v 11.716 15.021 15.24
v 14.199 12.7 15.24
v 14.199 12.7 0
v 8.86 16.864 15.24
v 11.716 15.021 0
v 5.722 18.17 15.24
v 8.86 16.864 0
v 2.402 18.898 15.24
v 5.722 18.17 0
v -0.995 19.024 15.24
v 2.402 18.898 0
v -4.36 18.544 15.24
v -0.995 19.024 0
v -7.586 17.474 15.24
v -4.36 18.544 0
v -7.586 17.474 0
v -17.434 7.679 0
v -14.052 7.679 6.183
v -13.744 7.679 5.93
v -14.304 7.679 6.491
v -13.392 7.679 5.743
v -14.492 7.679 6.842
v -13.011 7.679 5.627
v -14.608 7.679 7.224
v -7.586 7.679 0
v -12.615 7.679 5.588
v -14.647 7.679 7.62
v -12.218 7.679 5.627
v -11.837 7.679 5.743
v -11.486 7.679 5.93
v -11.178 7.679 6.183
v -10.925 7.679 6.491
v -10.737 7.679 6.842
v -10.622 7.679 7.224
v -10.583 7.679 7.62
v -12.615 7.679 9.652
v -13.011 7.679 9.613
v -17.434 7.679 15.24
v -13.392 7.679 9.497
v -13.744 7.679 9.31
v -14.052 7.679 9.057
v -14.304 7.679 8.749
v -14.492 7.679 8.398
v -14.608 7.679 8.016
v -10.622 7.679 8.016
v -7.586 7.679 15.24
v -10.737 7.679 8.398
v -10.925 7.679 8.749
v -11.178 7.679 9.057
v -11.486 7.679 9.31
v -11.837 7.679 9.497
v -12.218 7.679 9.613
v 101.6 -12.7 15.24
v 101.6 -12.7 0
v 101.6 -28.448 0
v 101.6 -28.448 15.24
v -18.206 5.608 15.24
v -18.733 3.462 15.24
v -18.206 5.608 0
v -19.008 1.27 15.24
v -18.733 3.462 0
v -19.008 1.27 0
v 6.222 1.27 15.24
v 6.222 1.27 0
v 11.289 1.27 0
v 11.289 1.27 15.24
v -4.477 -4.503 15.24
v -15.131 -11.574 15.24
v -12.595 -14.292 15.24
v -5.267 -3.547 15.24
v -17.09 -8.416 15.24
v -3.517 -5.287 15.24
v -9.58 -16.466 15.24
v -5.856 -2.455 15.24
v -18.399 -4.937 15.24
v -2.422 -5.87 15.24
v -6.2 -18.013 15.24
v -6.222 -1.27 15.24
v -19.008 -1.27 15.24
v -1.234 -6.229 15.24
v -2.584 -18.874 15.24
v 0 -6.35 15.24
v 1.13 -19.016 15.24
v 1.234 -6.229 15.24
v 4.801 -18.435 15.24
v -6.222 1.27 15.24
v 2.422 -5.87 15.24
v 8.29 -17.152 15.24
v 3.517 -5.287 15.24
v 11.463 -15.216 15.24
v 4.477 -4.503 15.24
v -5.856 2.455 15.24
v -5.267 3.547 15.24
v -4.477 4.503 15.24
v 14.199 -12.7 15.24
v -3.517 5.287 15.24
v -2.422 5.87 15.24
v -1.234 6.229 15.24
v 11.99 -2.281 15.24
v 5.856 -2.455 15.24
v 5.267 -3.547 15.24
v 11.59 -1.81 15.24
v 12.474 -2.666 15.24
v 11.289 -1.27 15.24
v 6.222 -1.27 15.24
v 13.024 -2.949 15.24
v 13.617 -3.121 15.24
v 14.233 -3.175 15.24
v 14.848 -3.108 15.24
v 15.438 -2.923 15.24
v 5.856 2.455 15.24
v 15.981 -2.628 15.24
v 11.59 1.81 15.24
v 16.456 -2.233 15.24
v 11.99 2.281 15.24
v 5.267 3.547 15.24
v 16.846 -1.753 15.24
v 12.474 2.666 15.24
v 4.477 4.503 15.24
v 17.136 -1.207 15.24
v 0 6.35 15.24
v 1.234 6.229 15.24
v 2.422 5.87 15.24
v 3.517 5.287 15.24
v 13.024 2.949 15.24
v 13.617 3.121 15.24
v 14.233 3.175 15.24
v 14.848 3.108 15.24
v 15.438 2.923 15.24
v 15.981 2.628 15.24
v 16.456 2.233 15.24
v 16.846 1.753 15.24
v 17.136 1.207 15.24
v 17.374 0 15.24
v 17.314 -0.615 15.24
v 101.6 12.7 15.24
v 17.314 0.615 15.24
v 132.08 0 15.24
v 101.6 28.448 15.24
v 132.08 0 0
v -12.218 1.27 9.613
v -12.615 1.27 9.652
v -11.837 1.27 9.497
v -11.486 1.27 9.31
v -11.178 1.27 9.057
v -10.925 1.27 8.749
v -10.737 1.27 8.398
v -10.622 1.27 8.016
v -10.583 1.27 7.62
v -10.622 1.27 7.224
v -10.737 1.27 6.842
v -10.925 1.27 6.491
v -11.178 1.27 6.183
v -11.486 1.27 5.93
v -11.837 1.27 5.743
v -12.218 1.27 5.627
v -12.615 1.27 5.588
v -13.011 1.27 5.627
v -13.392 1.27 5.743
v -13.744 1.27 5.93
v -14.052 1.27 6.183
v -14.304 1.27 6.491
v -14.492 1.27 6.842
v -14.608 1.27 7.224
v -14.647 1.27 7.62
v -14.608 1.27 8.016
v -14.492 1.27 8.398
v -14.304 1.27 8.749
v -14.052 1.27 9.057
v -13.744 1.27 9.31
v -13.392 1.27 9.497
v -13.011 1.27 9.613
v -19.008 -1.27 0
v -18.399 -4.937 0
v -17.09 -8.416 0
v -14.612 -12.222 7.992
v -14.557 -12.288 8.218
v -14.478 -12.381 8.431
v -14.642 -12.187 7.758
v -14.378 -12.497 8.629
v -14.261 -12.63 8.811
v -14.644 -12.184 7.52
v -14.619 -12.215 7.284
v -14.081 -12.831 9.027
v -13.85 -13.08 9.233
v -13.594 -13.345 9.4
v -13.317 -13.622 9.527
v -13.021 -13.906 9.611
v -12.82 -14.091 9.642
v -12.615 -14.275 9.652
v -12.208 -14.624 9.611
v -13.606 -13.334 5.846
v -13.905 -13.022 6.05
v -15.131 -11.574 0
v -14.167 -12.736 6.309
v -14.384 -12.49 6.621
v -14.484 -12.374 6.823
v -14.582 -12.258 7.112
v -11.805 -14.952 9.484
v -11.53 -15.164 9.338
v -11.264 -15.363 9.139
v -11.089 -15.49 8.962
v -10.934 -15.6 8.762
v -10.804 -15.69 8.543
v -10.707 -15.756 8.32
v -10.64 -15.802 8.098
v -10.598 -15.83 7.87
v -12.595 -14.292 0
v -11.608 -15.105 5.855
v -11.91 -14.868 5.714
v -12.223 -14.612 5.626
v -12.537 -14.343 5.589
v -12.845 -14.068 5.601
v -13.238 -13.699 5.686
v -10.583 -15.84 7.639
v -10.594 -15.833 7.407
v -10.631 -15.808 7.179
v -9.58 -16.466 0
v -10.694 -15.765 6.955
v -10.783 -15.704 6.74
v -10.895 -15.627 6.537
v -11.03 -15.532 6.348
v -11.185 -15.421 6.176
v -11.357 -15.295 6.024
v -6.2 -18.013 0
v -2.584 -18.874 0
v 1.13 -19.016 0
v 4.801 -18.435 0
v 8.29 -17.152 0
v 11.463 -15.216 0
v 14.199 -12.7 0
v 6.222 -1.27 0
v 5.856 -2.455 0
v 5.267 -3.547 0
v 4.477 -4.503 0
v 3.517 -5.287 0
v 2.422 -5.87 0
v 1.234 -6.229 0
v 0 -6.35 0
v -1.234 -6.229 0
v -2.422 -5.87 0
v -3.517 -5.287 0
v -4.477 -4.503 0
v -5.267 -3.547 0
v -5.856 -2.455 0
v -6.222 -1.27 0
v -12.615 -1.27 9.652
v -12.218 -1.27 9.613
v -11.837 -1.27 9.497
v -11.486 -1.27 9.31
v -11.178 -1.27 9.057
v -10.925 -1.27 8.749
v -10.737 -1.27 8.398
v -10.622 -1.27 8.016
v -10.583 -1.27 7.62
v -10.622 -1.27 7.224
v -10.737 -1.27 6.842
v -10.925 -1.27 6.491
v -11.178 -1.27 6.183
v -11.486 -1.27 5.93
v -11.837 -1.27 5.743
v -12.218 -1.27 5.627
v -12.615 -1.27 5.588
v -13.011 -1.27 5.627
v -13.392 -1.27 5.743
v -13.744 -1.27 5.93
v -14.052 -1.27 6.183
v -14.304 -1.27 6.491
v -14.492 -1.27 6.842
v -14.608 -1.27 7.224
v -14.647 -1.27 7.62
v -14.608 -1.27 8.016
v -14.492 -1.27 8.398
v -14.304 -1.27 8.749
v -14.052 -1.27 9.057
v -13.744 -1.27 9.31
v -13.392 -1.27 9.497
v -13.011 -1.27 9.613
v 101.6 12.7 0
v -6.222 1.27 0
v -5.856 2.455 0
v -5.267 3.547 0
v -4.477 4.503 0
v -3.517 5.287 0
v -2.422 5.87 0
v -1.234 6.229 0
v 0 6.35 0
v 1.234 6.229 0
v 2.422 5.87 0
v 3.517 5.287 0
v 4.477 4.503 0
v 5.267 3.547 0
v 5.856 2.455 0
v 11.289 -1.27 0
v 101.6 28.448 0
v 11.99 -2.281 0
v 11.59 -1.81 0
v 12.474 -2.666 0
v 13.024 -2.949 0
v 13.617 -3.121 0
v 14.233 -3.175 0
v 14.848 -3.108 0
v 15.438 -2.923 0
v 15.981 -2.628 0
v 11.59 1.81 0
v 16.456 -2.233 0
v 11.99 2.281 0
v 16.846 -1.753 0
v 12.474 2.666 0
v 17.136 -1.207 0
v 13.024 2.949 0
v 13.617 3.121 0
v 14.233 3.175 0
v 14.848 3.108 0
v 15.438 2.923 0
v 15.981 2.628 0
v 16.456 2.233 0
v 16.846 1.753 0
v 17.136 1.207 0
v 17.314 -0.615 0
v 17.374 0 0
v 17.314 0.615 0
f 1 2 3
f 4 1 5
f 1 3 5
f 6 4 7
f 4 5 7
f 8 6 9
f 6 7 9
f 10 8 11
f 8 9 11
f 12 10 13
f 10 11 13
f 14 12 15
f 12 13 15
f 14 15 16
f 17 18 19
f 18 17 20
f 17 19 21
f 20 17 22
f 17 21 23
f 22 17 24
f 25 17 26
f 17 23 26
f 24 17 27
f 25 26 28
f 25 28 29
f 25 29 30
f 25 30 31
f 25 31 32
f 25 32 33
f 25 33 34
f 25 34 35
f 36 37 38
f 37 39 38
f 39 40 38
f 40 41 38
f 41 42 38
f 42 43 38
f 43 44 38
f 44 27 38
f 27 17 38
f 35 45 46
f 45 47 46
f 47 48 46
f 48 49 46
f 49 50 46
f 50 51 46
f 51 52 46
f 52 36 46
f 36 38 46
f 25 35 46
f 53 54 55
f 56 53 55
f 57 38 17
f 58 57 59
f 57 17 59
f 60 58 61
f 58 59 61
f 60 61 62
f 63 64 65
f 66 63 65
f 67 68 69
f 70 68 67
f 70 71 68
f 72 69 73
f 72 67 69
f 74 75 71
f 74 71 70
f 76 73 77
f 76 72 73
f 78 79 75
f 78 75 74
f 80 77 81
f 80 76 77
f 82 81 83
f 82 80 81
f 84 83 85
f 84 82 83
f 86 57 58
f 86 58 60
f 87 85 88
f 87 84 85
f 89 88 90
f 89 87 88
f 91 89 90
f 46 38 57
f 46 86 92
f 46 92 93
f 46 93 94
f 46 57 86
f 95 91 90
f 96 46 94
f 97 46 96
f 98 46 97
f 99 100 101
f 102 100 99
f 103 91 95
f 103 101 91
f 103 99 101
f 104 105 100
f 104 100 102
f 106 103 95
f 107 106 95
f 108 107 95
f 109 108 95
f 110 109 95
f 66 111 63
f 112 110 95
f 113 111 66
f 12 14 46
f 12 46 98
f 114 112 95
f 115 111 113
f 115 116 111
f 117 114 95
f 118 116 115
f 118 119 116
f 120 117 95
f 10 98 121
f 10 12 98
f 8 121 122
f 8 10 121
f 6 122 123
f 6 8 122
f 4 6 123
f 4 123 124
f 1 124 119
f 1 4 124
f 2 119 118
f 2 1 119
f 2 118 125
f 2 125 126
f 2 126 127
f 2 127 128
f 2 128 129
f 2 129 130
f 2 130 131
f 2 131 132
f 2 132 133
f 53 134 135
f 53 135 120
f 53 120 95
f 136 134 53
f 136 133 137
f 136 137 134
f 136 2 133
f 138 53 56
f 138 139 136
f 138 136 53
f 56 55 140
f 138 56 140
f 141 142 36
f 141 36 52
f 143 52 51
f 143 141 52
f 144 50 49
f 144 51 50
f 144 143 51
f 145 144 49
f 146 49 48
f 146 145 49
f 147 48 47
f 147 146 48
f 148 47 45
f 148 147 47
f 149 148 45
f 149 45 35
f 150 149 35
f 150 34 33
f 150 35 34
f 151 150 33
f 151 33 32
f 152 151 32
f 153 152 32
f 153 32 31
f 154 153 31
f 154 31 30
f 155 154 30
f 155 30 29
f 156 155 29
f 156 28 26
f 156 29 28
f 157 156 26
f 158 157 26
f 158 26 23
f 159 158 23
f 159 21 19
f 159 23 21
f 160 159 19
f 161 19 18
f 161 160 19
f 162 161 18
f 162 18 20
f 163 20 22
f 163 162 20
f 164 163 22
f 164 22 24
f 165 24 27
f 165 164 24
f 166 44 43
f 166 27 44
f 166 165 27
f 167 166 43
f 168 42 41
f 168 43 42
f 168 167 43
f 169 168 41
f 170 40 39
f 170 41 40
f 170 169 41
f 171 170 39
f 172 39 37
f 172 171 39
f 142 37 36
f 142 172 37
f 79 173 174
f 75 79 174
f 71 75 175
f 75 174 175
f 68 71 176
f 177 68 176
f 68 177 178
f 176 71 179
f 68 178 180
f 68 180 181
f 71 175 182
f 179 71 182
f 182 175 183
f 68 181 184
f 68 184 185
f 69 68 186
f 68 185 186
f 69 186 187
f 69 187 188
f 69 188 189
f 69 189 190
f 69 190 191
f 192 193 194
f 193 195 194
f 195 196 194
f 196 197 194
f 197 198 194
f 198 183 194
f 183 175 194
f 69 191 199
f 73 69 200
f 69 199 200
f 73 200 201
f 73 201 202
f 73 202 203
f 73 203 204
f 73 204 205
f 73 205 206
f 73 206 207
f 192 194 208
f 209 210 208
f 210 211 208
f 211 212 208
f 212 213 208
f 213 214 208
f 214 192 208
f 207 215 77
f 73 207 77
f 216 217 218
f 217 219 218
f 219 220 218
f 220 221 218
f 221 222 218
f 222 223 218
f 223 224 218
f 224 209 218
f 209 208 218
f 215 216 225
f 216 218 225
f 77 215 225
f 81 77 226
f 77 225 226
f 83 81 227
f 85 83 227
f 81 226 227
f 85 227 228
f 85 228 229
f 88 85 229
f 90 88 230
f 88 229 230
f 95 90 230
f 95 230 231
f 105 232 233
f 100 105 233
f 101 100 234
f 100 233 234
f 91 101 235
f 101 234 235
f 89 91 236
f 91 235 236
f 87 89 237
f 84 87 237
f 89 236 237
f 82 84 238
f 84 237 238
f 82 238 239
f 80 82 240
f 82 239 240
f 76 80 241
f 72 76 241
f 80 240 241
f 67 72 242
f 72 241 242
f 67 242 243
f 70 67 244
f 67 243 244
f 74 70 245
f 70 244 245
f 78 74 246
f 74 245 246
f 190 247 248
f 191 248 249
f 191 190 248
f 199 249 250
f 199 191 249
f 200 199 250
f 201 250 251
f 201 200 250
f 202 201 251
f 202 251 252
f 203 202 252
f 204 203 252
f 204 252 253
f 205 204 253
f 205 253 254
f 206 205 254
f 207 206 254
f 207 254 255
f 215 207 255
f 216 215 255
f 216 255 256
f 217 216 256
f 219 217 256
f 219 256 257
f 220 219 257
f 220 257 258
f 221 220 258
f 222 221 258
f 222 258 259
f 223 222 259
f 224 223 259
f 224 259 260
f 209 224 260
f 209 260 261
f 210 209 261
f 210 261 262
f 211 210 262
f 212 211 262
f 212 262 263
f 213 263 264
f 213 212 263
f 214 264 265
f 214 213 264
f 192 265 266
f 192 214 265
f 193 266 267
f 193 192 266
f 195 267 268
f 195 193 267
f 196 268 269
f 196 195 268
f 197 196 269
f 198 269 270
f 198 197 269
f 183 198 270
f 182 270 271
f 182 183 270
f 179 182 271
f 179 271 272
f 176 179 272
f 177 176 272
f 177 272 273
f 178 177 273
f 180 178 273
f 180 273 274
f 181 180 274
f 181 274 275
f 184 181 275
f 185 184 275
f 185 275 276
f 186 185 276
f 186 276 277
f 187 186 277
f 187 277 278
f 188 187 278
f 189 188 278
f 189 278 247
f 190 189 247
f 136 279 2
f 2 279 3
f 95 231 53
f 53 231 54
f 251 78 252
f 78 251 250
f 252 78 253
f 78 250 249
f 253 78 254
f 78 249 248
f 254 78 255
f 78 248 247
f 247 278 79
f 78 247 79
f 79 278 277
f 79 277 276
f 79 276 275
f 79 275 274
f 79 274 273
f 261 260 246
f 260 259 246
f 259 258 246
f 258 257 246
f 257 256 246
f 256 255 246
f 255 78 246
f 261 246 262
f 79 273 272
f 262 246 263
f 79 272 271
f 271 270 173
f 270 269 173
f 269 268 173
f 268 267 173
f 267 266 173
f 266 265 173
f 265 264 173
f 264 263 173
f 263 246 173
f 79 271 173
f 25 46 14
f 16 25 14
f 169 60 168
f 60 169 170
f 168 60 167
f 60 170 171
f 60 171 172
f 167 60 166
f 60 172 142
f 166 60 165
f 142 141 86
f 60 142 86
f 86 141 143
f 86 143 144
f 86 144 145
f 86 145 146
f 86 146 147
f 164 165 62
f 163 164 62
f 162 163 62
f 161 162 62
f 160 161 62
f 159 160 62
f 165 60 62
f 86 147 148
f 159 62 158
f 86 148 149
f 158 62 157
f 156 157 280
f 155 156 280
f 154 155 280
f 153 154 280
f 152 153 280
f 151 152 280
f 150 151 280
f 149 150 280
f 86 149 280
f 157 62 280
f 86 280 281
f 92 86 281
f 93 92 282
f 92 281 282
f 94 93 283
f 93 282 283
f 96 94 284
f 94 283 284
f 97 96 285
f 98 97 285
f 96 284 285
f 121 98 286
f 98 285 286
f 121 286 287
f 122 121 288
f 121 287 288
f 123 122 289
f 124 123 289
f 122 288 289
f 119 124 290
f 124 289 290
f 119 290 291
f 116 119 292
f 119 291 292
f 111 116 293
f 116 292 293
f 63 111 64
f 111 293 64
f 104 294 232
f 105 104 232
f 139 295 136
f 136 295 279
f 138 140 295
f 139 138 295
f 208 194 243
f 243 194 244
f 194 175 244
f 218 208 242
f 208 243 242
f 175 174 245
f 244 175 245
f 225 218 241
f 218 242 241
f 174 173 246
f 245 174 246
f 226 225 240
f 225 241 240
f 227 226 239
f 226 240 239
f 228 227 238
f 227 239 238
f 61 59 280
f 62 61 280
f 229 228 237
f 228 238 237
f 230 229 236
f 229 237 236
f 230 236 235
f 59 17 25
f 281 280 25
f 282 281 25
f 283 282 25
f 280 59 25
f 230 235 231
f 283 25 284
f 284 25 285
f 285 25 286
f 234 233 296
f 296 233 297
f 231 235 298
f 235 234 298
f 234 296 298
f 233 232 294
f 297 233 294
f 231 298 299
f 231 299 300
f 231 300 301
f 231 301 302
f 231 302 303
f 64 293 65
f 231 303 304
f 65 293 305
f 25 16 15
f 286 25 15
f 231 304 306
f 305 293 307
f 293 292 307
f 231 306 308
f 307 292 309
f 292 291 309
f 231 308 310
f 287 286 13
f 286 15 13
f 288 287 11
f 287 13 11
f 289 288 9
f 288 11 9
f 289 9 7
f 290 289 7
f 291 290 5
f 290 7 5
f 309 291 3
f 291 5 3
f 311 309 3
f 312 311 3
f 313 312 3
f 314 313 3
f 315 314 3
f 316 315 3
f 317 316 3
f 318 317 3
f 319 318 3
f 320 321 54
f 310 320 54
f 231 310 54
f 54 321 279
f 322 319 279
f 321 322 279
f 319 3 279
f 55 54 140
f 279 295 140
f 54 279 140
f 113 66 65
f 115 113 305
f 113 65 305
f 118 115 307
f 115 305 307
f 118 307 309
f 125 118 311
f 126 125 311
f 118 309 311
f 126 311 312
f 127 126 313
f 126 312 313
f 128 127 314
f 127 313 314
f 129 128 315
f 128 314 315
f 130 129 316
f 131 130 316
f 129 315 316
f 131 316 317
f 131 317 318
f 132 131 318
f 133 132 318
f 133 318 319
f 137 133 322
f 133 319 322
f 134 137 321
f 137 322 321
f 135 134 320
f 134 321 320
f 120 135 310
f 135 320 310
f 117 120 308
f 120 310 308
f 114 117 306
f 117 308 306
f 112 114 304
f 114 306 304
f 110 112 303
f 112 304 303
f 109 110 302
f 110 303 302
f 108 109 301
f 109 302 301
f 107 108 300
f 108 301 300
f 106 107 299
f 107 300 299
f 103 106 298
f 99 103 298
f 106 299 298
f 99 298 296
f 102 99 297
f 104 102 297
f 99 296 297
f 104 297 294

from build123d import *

# Parameters (mm, degrees)
BOSS_EXTRUDE1_DEPTH     = 15.24
CUT_EXTRUDE1_DEPTH      = 136.965704146
CUT_EXTRUDE1_DEPTH_BACK = 136.965704146
SKETCH2_R               = 2.032
SKETCH3_W               = 13.96136878
SKETCH3_H               = 14.958609408
CUT_EXTRUDE2_DEPTH      = 136.965704158


with BuildPart() as part:
    # Sketch1 → Boss-Extrude1 (new body)
    with BuildSketch(Plane.XY):
        with BuildLine():
            Line((14.199031657, -12.7), (101.6, -12.7))
            Line((101.6, -12.7), (101.6, -28.448))
            Line((101.6, -28.448), (132.08, 0))
            Line((132.08, 0), (101.6, 28.448))
            Line((101.6, 28.448), (101.6, 12.7))
            Line((101.6, 12.7), (14.199031657, 12.7))
            ThreePointArc((14.199031657, 12.7), (-6.20014954, 18.012791168), (-19.007619525, 1.27))
            Line((-19.007619525, 1.27), (-6.221703947, 1.27))
            ThreePointArc((-6.221703947, 1.27), (0, 6.35), (6.221703947, 1.27))
            Line((6.221703947, 1.27), (11.289096091, 1.27))
            ThreePointArc((11.289096091, 1.27), (17.374031657, 0), (11.289096091, -1.27))
            Line((11.289096091, -1.27), (6.221703947, -1.27))
            ThreePointArc((6.221703947, -1.27), (0, -6.35), (-6.221703947, -1.27))
            Line((-6.221703947, -1.27), (-19.007619525, -1.27))
            ThreePointArc((-19.007619525, -1.27), (-6.20014954, -18.012791168), (14.199031657, -12.7))
        make_face()
    extrude(amount=BOSS_EXTRUDE1_DEPTH)

    # Sketch2 → Cut-Extrude1 (cut, two sides: drawn at the far end of the back side and taken through both)
    with BuildSketch(Plane(origin=(0, 0, 0), x_dir=(1, 0, 0), z_dir=(0, 1, 0)).offset(-CUT_EXTRUDE1_DEPTH_BACK)):
        with Locations(Location((-12.614661736, -7.62, 0), (0, 0, 270))):
            Circle(SKETCH2_R)
    extrude(amount=CUT_EXTRUDE1_DEPTH + CUT_EXTRUDE1_DEPTH_BACK, mode=Mode.SUBTRACT)

    # Sketch3 → Cut-Extrude2 (cut, through all)
    with BuildSketch(Plane.XY.offset(15.24)):
        with Locations((-14.567066479, 15.158057533)):
            Rectangle(SKETCH3_W, SKETCH3_H)
    extrude(amount=-CUT_EXTRUDE2_DEPTH, mode=Mode.SUBTRACT)


solid = part.part
